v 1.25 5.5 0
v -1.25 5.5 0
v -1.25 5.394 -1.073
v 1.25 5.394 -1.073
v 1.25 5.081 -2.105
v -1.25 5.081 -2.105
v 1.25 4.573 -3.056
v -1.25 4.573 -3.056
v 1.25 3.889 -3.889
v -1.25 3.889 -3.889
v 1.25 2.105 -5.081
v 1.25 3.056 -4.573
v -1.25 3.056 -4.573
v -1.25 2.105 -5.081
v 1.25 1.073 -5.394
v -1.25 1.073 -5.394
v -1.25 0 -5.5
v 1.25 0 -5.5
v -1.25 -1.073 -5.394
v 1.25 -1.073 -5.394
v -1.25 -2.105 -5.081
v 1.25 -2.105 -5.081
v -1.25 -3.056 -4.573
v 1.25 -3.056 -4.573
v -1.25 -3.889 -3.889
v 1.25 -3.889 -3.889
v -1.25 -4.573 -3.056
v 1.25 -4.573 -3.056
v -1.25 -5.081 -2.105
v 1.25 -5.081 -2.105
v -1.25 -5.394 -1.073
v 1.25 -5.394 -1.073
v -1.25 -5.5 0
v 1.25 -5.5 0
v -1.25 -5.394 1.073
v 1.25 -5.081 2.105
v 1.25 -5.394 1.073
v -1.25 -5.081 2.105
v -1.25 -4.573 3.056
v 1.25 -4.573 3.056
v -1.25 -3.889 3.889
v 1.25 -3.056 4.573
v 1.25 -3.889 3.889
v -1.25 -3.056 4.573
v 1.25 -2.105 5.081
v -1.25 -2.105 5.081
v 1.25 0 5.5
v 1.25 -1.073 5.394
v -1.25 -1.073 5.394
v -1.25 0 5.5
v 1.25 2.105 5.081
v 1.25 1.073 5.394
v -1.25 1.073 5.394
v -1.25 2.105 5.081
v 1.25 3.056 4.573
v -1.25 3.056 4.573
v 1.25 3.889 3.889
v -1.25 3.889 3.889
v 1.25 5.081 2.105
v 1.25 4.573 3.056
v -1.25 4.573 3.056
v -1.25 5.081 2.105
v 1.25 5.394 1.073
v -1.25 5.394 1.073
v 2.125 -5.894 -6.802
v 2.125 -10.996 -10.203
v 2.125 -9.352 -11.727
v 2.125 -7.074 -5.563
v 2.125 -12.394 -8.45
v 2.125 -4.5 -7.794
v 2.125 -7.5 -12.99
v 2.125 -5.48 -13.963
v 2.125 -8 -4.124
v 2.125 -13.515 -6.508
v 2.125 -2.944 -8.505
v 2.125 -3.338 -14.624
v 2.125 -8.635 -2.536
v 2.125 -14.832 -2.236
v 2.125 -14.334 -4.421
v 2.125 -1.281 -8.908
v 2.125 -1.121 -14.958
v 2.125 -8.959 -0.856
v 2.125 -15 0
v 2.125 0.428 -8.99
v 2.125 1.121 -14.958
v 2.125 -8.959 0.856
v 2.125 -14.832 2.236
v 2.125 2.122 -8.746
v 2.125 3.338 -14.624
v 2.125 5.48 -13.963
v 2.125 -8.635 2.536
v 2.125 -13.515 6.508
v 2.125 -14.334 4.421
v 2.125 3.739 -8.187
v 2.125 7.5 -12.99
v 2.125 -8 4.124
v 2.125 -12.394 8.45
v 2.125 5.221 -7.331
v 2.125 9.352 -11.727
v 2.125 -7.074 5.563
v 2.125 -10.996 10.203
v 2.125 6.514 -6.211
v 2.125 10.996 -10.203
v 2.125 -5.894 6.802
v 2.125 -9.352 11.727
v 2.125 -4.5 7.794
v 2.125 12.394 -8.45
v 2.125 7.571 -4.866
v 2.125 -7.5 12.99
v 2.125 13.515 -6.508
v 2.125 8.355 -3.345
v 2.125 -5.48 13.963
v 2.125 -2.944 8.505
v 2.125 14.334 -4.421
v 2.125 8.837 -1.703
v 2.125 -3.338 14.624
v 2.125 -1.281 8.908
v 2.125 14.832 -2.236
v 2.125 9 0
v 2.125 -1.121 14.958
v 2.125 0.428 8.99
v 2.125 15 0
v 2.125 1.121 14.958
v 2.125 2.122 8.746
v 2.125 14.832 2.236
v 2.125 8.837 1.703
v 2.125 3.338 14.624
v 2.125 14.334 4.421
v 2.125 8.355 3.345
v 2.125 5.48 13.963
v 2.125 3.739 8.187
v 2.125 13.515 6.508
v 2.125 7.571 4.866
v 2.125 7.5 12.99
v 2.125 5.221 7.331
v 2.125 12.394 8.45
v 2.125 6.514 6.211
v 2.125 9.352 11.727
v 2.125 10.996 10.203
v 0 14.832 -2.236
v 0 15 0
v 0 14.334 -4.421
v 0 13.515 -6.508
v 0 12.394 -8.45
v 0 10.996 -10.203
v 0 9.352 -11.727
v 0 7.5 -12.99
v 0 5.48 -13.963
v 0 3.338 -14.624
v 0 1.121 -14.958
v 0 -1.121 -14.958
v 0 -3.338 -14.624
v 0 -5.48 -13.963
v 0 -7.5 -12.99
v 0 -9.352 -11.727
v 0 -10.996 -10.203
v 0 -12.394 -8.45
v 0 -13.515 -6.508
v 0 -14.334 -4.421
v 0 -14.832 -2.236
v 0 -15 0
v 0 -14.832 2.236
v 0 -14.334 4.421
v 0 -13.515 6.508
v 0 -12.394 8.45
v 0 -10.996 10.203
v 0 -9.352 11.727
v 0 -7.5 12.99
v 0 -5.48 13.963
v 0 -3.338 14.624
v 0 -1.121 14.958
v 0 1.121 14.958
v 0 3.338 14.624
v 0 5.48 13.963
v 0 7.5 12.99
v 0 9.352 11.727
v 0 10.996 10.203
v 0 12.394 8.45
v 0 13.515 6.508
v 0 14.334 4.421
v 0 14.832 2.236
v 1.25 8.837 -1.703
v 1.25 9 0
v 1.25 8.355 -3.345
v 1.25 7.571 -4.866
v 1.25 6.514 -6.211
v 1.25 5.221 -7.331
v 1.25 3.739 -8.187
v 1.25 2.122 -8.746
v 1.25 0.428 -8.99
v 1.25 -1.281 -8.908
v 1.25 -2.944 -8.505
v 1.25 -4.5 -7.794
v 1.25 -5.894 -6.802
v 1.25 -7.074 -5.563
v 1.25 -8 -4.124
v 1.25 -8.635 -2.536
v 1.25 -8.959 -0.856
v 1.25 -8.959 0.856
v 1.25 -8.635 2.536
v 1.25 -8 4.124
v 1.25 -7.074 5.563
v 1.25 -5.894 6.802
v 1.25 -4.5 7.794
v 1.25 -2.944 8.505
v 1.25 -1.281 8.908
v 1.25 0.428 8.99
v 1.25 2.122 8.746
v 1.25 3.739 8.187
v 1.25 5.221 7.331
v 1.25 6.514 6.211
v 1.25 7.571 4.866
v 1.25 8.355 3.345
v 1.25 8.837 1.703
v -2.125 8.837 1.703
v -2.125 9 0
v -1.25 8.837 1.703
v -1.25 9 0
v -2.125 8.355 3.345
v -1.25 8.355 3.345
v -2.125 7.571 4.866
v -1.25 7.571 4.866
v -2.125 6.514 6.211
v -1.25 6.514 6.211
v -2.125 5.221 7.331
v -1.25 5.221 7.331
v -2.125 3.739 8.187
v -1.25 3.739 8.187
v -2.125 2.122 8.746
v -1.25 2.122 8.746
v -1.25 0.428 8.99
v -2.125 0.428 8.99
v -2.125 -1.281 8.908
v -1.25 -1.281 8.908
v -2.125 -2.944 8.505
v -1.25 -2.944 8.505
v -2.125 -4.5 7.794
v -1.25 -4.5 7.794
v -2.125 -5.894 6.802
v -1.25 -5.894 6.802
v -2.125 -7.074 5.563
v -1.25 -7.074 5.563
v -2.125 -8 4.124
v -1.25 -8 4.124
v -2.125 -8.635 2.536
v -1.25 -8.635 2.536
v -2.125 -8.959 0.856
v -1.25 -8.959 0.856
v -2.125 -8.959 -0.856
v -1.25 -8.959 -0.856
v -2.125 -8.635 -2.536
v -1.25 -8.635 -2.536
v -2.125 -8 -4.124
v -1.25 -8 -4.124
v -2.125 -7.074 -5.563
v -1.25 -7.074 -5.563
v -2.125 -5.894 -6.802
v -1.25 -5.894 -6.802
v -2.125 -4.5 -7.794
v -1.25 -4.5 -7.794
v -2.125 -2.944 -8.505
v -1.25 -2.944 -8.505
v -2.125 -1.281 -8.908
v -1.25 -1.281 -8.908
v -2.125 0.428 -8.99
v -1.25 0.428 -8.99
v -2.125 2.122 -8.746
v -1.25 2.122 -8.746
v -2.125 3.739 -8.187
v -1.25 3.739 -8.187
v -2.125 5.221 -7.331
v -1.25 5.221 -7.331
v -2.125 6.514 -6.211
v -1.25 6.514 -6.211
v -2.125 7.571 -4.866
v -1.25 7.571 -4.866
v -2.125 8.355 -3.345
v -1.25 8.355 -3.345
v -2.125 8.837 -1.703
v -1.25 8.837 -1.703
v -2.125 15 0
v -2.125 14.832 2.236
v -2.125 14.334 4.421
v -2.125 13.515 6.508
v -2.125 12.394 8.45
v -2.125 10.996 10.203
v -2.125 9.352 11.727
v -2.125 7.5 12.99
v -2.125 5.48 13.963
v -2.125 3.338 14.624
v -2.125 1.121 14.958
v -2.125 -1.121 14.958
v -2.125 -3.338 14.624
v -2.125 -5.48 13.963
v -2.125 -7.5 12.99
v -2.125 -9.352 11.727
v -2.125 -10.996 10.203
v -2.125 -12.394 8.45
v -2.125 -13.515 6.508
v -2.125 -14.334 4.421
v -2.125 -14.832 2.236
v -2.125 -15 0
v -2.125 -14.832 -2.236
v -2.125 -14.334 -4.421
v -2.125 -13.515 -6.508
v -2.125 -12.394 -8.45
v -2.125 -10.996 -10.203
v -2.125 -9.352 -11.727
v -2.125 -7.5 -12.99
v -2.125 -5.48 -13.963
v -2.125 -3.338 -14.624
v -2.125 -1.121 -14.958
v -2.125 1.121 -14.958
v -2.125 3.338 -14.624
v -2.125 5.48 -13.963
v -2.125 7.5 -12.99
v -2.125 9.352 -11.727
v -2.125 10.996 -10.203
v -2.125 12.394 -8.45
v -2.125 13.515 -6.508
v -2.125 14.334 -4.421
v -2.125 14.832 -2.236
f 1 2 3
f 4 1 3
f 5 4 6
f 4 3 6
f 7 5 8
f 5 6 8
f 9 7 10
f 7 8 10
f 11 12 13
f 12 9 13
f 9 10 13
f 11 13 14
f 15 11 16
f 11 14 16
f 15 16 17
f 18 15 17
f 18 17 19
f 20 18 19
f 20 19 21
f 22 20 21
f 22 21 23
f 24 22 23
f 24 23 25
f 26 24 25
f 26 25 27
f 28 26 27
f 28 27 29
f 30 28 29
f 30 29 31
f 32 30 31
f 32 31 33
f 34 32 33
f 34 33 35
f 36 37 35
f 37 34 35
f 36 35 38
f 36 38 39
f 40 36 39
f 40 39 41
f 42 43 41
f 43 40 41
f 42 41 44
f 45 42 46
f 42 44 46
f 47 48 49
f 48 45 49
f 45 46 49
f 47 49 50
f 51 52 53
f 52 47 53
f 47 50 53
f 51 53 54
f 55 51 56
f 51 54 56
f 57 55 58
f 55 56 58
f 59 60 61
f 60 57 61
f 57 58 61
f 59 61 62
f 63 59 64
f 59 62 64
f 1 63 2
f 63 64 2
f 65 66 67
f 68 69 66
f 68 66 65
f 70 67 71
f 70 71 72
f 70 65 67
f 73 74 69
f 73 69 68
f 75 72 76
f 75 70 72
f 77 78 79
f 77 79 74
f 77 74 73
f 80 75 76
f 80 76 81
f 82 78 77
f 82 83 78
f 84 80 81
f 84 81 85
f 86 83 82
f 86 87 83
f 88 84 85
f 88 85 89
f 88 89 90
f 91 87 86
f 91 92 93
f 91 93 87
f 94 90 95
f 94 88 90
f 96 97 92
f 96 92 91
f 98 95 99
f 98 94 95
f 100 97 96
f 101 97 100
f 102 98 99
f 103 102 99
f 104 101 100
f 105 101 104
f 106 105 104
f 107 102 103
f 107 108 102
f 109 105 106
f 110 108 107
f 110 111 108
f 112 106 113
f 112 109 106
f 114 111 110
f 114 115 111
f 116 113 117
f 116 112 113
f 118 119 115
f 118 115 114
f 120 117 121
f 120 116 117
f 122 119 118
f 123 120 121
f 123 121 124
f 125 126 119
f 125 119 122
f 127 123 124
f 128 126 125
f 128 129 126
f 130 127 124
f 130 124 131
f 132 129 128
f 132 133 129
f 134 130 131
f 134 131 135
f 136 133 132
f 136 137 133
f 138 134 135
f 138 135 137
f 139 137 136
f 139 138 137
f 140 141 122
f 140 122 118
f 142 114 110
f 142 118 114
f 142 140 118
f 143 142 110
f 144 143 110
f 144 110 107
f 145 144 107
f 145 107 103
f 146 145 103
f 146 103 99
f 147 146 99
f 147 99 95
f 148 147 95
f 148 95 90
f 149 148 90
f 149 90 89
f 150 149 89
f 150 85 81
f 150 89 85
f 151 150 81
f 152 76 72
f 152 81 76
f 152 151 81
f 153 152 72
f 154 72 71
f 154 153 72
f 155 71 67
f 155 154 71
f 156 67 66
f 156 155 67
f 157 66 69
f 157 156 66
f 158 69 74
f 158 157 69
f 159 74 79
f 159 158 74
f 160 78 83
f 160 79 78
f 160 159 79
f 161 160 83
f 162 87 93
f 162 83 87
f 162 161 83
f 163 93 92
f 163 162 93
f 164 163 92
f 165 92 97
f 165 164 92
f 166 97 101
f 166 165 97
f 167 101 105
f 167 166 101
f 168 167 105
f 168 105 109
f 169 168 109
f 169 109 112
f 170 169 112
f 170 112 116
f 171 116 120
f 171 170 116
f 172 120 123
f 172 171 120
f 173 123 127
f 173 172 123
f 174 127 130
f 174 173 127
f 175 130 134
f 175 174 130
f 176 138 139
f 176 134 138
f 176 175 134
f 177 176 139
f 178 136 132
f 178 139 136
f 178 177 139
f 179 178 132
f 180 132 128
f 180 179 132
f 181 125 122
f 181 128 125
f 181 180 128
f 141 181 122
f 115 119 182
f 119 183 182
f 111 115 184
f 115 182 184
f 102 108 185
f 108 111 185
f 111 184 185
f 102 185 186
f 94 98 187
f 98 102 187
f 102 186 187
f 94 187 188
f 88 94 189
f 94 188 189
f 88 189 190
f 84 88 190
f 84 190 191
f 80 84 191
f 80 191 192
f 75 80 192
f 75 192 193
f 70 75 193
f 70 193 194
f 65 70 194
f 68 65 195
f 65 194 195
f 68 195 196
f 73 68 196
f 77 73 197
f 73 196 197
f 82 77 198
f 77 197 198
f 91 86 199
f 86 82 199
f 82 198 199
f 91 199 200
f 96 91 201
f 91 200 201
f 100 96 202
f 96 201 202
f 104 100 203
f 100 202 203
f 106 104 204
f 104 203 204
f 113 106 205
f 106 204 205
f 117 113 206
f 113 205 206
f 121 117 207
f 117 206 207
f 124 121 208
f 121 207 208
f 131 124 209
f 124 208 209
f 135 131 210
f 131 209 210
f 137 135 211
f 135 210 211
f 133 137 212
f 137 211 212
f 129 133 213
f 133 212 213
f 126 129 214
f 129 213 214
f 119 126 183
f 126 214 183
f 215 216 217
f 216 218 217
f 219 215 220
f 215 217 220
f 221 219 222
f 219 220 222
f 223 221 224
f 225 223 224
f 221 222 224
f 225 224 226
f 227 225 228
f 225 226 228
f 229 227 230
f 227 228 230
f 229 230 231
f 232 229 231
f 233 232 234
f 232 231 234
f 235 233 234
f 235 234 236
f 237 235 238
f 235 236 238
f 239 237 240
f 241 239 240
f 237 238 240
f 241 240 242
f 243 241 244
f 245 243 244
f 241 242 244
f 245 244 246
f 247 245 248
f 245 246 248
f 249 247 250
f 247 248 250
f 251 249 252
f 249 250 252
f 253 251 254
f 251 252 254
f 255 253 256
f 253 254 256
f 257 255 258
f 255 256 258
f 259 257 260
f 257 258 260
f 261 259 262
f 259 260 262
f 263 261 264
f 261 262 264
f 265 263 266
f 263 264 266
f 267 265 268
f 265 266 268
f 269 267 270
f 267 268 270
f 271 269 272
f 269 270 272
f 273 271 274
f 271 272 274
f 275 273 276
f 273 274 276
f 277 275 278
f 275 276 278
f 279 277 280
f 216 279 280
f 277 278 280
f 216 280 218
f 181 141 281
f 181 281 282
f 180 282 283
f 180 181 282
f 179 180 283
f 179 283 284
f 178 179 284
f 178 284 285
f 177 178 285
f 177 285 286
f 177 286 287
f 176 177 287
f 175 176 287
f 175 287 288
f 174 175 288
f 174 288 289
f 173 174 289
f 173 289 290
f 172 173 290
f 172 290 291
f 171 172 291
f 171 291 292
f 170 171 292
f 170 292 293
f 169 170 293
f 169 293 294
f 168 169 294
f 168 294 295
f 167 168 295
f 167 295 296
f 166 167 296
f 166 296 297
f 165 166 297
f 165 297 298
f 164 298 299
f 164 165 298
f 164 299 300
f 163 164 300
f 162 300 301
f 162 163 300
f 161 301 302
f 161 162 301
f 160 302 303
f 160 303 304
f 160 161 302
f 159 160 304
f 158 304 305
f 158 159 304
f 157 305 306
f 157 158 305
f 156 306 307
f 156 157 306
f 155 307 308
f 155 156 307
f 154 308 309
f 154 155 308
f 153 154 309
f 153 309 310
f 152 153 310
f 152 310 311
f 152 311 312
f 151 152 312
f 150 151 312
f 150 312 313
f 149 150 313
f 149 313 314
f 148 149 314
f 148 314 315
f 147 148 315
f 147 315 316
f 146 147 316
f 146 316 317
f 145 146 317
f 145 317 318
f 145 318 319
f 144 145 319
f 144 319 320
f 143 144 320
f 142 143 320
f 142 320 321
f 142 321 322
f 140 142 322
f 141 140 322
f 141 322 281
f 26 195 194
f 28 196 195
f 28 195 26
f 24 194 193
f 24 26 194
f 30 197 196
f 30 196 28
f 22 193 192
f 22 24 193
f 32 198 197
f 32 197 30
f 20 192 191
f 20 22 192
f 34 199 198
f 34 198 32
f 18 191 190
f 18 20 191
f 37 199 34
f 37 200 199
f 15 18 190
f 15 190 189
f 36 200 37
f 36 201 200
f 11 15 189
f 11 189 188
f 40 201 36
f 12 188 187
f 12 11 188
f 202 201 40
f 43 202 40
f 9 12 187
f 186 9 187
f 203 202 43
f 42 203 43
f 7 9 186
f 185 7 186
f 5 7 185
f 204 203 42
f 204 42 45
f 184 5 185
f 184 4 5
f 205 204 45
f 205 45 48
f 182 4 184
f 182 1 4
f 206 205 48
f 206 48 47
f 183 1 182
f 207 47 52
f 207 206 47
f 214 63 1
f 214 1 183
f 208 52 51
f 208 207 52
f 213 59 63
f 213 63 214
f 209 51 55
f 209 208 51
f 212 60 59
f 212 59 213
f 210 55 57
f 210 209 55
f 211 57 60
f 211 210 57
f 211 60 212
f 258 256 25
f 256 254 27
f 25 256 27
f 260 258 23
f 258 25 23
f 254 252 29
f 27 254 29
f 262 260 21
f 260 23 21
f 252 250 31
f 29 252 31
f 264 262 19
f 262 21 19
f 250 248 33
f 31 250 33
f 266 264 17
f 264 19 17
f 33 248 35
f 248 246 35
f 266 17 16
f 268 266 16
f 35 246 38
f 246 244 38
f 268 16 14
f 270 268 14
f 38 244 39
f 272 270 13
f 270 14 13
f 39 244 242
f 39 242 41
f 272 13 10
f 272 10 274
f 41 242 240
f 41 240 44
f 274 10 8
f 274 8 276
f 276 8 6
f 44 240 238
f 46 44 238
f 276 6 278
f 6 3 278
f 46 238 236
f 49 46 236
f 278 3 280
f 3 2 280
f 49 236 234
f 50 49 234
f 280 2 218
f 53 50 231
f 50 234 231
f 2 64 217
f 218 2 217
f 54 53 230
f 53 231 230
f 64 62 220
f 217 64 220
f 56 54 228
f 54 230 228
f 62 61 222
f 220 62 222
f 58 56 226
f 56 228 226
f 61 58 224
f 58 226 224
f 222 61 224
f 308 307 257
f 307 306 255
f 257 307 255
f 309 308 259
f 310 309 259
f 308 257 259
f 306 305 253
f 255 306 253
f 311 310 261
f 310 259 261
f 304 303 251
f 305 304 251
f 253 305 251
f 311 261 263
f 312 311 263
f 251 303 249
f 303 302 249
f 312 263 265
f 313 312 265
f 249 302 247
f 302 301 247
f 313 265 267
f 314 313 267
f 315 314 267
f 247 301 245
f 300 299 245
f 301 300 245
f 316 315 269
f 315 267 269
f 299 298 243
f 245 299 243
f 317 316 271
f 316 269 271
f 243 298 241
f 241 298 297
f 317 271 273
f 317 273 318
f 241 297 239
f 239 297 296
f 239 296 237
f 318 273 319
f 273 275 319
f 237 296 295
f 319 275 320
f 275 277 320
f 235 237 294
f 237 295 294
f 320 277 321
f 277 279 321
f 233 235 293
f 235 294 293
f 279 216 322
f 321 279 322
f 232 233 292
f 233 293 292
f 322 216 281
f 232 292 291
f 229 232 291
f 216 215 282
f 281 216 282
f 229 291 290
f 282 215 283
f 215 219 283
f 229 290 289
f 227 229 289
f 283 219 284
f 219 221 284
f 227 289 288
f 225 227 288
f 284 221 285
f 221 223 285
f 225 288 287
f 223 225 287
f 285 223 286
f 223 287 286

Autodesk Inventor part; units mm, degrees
ref_plane "YZ Plane" through (0, 0, 0) normal (1, 0, 0) x (0, 1, 0)
ref_plane "XZ Plane" through (0, 0, 0) normal (0, 1, 0) x (-1, 0, 0)
ref_plane "XY Plane" through (0, 0, 0) normal (0, 0, 1) x (1, 0, 0)
sketch "Эскиз1" plane through (0, 0, 0) normal (1, 0, 0) x (0, 1, 0)
  circle A0 centre (0, 0) radius 5.5
  circle A1 centre (0, 0) radius 9
  dimension "d0" = 11
  dimension "d1" = 18
extrude "Выдавливание1" add sketch "Эскиз1" along normal mid plane 2.5
sketch "Эскиз2" plane through (0, 0, 0) normal (1, 0, 0) x (0, 1, 0)
  circle A0 centre (0, 0) radius 9 projected
  circle A1 centre (0, 0) radius 15
  dimension "d4" = 30
extrude "Выдавливание2" add sketch "Эскиз2" along normal mid plane 4.25
properties part number "wheel"
